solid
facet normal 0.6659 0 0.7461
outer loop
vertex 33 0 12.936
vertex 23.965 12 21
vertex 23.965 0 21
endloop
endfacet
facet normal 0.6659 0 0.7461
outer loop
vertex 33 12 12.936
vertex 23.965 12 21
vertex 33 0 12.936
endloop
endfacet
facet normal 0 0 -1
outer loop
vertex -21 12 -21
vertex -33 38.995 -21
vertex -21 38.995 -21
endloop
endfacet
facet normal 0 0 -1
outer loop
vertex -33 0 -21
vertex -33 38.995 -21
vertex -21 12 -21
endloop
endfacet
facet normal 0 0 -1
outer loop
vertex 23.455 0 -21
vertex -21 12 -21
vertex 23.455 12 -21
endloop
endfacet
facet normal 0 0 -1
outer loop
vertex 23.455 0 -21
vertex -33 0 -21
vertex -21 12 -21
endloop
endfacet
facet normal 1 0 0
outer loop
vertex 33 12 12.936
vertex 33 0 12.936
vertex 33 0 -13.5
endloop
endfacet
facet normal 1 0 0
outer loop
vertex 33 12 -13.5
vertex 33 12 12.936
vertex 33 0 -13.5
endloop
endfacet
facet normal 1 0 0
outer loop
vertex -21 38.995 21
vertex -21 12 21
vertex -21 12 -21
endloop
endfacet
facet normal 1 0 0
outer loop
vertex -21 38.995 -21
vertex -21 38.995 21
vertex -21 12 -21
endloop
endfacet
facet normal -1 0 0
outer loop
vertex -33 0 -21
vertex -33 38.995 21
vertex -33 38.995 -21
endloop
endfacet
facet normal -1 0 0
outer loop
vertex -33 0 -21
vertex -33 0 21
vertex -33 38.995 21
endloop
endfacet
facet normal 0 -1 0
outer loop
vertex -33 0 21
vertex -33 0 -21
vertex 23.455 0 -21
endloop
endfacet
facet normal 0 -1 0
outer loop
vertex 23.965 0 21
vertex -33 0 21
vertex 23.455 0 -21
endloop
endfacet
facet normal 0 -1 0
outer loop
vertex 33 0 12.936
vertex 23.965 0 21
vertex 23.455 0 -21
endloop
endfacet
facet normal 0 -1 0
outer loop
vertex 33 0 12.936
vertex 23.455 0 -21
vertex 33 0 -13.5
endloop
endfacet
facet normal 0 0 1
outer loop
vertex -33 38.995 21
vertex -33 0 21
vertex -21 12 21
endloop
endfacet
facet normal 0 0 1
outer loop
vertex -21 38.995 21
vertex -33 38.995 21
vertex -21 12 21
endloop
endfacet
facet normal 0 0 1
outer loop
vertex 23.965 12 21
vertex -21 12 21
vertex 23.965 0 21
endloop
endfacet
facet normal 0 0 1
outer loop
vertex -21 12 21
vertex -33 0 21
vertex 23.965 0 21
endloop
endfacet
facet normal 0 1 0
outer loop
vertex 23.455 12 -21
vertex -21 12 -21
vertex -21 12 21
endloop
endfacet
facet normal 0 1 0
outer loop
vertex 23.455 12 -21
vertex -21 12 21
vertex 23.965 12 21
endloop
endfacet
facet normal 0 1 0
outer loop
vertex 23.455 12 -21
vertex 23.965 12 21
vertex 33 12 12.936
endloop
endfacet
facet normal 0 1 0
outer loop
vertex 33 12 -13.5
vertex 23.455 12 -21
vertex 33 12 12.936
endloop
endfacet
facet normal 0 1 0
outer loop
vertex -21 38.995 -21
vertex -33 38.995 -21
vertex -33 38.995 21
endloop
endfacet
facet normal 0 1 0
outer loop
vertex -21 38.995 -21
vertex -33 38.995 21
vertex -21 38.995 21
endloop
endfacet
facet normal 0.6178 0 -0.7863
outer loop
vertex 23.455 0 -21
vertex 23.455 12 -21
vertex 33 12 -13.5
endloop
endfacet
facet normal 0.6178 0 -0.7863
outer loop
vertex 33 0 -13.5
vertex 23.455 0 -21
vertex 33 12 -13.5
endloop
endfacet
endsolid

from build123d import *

# Parameters (mm, degrees)
SKETCH1_W           = 66
SKETCH1_H           = 42
BOSS_EXTRUDE1_DEPTH = 12
SKETCH2_W           = 12
SKETCH2_H           = 42
BOSS_EXTRUDE2_DEPTH = 26.995042498
CUT_EXTRUDE1_DEPTH  = 12


with BuildPart() as part:
    # Sketch1 → Boss-Extrude1 (new body)
    with BuildSketch(Plane(origin=(0, 0, 0), x_dir=(1, 0, 0), z_dir=(0, 1, 0))):
        Rectangle(SKETCH1_W, SKETCH1_H)
    extrude(amount=BOSS_EXTRUDE1_DEPTH)

    # Sketch2 → Boss-Extrude2 (add)
    with BuildSketch(Plane(origin=(0, 12, 0), x_dir=(1, 0, 0), z_dir=(0, 1, 0))):
        with Locations((-27, 0)):
            Rectangle(SKETCH2_W, SKETCH2_H)
    extrude(amount=BOSS_EXTRUDE2_DEPTH)

    # Sketch12 → Cut-Extrude1 (cut)
    with BuildSketch(Plane(origin=(0, 12, 0), x_dir=(1, 0, 0), z_dir=(0, 1, 0))):
        Polygon((33, -12.935780303), (33, -21), (23.965356614, -21), align=None)
        Polygon((33, 13.5), (33, 21), (23.455136658, 21), align=None)
    extrude(amount=-CUT_EXTRUDE1_DEPTH, mode=Mode.SUBTRACT)


solid = part.part
